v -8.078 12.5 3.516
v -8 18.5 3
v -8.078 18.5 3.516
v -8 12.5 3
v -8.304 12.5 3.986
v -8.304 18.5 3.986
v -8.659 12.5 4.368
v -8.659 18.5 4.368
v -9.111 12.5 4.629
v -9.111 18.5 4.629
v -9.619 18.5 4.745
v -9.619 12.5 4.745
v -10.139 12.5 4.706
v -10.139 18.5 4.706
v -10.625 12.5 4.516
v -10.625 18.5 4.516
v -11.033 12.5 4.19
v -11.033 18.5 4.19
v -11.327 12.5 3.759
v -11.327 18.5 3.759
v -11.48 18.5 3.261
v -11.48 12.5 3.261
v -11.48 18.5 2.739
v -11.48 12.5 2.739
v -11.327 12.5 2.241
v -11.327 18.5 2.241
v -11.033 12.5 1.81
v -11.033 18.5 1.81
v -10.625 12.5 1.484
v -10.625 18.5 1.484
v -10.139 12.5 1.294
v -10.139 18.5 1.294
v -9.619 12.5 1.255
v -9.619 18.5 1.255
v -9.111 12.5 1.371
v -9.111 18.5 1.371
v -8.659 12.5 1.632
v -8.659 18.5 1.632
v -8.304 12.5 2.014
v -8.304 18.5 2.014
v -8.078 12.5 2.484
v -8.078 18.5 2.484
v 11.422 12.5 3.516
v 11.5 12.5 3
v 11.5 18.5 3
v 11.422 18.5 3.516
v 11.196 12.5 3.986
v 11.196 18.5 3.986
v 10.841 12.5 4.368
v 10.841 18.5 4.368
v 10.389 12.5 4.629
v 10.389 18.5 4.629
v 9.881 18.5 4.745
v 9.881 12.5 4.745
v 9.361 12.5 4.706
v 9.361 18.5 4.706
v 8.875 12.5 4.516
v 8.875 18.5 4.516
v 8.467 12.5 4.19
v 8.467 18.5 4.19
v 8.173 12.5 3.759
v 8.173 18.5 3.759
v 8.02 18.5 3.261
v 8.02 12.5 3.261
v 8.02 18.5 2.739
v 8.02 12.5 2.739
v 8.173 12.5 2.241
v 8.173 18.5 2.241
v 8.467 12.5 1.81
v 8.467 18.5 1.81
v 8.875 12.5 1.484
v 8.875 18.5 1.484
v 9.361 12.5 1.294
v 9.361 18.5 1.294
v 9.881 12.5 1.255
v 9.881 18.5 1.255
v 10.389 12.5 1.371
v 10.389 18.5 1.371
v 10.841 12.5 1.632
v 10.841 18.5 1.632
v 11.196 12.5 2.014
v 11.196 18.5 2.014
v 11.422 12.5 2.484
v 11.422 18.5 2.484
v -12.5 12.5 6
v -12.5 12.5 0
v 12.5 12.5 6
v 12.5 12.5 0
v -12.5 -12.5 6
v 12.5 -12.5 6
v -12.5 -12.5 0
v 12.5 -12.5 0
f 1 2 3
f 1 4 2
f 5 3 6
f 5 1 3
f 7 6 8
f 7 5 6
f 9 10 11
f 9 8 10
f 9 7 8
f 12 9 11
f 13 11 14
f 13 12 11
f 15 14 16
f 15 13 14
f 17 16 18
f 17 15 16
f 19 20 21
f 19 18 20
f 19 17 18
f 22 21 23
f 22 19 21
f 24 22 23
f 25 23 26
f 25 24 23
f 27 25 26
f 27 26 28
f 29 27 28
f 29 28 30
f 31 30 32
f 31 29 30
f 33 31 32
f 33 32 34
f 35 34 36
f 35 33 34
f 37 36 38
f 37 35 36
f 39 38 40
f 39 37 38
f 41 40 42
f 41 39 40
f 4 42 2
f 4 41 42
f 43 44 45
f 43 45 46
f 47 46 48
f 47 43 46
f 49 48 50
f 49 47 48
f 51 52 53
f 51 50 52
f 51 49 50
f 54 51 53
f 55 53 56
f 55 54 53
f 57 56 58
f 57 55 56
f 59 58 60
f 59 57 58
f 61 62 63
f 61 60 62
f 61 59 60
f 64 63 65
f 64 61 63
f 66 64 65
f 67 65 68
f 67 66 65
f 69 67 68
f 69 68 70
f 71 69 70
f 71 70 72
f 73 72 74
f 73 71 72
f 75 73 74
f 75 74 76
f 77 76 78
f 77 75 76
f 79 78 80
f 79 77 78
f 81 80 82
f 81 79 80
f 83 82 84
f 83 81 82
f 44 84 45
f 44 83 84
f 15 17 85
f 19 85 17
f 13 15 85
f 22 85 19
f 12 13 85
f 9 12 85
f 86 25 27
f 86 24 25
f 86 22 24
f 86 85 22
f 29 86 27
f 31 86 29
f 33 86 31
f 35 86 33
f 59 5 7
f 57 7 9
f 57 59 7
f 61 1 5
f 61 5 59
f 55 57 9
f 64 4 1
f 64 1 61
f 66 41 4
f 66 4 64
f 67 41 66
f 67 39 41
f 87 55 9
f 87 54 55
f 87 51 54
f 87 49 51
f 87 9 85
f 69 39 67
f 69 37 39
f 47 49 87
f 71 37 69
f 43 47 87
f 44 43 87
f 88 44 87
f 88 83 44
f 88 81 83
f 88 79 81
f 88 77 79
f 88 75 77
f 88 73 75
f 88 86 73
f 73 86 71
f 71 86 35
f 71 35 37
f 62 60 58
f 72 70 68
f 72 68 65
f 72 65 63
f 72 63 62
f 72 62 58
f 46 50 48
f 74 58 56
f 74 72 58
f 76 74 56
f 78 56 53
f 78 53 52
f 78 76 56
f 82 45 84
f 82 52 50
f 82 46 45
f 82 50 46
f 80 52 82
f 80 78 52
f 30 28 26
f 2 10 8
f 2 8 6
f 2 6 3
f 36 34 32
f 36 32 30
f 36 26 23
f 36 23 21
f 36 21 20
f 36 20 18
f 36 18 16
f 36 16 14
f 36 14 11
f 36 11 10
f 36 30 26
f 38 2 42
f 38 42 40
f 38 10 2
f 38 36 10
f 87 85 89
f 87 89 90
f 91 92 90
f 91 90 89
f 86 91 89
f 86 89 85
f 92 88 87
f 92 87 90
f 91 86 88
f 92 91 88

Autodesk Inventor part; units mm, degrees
ref_plane "YZ Plane" through (0, 0, 0) normal (1, 0, 0) x (0, 1, 0)
ref_plane "XZ Plane" through (0, 0, 0) normal (0, 1, 0) x (-1, 0, 0)
ref_plane "XY Plane" through (0, 0, 0) normal (0, 0, 1) x (1, 0, 0)
sketch "Sketch1" plane through (0, 0, 0) normal (0, 0, 1) x (1, 0, 0)
  line L0 (-12.5, 12.5) -> (12.5, 12.5)
  line L1 (12.5, 12.5) -> (12.5, -12.5)
  line L2 (12.5, -12.5) -> (-12.5, -12.5)
  line L3 (-12.5, -12.5) -> (-12.5, 12.5)
  line L4 (-12.5, 12.5) -> (12.5, -12.5) construction
  line L5 (12.5, 12.5) -> (-12.5, -12.5) construction
  point P0 (0, 0)
  dimension "d0" = 25
  dimension "d1" = 25
extrude "Extrusion1" add sketch "Sketch1" along normal blind 6
sketch "Sketch2" plane through (-12.5, 12.5, 0) normal (0, 1, 0) x (1, 0, 0)
  circle A0 centre (2.75, -3) radius 1.75
  circle A1 centre (22.25, -3) radius 1.75
  line L0 (25, -6) -> (0, -6) projected
  line L1 (0, 0) -> (0, -6) projected
  line L2 (25, 0) -> (25, -6) projected
  point P0 (12.5, 0)
  dimension "d4" = 3
  dimension "d5" = 3.5
  dimension "d6" = 3.5
  dimension "d7" = 2.75
  dimension "d8" = 2.75
extrude "Extrusion2" add sketch "Sketch2" along normal blind 6
properties part number "watercoolerpatch"
